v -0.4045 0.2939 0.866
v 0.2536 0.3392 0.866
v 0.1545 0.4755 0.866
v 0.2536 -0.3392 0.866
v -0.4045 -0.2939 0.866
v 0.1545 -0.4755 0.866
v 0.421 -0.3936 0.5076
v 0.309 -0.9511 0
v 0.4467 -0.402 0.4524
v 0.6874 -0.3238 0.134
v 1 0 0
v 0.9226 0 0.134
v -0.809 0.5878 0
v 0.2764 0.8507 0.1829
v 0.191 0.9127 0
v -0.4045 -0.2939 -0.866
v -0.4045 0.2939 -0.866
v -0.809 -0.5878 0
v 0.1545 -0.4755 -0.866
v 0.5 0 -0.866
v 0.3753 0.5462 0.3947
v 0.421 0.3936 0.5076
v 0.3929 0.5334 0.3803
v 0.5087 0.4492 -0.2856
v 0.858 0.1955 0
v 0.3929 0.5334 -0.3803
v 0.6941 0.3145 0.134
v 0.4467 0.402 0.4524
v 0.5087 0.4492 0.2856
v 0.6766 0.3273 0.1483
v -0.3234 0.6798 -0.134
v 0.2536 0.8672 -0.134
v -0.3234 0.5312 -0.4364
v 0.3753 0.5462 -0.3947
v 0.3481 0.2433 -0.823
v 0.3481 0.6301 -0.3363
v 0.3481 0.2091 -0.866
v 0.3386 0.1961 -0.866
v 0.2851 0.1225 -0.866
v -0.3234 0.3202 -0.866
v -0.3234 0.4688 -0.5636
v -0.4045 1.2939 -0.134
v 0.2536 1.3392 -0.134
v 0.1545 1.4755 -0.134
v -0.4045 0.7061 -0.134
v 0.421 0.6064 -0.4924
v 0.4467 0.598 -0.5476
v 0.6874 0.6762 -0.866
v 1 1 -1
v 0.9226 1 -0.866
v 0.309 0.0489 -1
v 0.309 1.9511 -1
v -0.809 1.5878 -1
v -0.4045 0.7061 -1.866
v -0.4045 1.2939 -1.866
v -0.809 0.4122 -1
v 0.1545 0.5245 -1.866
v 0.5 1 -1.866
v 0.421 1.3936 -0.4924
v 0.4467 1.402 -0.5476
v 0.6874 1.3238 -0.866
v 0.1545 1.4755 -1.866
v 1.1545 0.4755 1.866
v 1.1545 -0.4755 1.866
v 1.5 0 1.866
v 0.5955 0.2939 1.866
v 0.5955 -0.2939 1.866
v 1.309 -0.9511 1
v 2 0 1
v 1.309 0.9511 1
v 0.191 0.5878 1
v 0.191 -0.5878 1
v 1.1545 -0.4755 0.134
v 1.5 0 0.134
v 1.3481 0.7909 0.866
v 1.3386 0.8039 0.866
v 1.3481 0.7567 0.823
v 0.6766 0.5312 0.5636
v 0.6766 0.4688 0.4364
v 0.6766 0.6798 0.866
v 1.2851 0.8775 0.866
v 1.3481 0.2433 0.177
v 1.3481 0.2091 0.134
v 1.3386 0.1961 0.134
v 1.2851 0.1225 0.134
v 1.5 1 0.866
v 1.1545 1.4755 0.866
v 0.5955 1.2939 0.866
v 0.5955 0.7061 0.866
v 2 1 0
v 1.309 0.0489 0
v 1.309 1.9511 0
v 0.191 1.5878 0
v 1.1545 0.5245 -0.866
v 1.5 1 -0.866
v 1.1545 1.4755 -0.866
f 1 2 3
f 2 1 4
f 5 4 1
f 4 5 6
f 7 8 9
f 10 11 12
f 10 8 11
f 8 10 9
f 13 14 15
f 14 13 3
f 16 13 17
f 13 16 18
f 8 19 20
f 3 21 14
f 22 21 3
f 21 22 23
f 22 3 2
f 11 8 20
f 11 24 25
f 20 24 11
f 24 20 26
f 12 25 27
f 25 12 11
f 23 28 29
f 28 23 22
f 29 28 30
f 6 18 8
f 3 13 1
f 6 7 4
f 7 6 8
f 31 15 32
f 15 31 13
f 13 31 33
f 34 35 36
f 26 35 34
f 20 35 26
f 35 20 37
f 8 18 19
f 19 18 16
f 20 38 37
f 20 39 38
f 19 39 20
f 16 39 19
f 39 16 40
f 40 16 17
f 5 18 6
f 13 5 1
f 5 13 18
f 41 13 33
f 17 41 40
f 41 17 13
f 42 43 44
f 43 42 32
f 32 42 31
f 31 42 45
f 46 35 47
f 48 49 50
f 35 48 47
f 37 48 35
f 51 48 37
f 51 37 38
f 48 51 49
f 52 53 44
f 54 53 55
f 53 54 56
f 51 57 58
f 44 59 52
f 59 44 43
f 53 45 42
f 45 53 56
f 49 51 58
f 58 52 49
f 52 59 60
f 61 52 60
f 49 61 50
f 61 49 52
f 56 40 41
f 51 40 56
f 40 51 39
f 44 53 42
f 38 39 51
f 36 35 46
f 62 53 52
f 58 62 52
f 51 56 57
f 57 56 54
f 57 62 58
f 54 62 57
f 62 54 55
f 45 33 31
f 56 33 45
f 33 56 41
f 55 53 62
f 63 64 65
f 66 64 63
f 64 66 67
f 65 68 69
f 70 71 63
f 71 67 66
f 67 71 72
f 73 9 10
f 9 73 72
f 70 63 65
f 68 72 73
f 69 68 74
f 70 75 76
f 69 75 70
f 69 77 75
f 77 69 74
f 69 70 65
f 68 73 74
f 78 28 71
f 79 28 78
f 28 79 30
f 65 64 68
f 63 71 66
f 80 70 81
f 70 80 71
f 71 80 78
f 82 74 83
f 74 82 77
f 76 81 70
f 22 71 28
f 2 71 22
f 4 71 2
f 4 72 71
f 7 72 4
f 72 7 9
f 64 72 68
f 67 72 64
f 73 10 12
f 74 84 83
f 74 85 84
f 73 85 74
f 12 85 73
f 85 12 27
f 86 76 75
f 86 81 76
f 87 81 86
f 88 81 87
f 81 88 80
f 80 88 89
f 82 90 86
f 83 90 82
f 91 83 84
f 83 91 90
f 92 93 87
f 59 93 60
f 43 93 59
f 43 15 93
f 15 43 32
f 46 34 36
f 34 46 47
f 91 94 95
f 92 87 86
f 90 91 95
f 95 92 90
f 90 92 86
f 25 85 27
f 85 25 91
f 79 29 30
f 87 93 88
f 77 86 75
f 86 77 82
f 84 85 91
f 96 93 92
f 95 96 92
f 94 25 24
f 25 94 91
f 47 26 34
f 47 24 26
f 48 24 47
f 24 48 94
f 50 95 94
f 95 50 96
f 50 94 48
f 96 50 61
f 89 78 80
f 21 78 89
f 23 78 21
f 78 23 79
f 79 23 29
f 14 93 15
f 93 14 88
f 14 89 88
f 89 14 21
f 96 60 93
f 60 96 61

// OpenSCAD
function f(x,y)=((x)^2)-(y^2);



min_value=0;
max_value=1;

resolution=1;
//解析度

thickness=3;


points=[
for (i=[min_value:resolution:max_value])
    for (j=[min_value:resolution:max_value])
        [i,j,f(i,j)]    
    ];
    


for (point = points)
     translate(point)
          sphere(1);
    
 
